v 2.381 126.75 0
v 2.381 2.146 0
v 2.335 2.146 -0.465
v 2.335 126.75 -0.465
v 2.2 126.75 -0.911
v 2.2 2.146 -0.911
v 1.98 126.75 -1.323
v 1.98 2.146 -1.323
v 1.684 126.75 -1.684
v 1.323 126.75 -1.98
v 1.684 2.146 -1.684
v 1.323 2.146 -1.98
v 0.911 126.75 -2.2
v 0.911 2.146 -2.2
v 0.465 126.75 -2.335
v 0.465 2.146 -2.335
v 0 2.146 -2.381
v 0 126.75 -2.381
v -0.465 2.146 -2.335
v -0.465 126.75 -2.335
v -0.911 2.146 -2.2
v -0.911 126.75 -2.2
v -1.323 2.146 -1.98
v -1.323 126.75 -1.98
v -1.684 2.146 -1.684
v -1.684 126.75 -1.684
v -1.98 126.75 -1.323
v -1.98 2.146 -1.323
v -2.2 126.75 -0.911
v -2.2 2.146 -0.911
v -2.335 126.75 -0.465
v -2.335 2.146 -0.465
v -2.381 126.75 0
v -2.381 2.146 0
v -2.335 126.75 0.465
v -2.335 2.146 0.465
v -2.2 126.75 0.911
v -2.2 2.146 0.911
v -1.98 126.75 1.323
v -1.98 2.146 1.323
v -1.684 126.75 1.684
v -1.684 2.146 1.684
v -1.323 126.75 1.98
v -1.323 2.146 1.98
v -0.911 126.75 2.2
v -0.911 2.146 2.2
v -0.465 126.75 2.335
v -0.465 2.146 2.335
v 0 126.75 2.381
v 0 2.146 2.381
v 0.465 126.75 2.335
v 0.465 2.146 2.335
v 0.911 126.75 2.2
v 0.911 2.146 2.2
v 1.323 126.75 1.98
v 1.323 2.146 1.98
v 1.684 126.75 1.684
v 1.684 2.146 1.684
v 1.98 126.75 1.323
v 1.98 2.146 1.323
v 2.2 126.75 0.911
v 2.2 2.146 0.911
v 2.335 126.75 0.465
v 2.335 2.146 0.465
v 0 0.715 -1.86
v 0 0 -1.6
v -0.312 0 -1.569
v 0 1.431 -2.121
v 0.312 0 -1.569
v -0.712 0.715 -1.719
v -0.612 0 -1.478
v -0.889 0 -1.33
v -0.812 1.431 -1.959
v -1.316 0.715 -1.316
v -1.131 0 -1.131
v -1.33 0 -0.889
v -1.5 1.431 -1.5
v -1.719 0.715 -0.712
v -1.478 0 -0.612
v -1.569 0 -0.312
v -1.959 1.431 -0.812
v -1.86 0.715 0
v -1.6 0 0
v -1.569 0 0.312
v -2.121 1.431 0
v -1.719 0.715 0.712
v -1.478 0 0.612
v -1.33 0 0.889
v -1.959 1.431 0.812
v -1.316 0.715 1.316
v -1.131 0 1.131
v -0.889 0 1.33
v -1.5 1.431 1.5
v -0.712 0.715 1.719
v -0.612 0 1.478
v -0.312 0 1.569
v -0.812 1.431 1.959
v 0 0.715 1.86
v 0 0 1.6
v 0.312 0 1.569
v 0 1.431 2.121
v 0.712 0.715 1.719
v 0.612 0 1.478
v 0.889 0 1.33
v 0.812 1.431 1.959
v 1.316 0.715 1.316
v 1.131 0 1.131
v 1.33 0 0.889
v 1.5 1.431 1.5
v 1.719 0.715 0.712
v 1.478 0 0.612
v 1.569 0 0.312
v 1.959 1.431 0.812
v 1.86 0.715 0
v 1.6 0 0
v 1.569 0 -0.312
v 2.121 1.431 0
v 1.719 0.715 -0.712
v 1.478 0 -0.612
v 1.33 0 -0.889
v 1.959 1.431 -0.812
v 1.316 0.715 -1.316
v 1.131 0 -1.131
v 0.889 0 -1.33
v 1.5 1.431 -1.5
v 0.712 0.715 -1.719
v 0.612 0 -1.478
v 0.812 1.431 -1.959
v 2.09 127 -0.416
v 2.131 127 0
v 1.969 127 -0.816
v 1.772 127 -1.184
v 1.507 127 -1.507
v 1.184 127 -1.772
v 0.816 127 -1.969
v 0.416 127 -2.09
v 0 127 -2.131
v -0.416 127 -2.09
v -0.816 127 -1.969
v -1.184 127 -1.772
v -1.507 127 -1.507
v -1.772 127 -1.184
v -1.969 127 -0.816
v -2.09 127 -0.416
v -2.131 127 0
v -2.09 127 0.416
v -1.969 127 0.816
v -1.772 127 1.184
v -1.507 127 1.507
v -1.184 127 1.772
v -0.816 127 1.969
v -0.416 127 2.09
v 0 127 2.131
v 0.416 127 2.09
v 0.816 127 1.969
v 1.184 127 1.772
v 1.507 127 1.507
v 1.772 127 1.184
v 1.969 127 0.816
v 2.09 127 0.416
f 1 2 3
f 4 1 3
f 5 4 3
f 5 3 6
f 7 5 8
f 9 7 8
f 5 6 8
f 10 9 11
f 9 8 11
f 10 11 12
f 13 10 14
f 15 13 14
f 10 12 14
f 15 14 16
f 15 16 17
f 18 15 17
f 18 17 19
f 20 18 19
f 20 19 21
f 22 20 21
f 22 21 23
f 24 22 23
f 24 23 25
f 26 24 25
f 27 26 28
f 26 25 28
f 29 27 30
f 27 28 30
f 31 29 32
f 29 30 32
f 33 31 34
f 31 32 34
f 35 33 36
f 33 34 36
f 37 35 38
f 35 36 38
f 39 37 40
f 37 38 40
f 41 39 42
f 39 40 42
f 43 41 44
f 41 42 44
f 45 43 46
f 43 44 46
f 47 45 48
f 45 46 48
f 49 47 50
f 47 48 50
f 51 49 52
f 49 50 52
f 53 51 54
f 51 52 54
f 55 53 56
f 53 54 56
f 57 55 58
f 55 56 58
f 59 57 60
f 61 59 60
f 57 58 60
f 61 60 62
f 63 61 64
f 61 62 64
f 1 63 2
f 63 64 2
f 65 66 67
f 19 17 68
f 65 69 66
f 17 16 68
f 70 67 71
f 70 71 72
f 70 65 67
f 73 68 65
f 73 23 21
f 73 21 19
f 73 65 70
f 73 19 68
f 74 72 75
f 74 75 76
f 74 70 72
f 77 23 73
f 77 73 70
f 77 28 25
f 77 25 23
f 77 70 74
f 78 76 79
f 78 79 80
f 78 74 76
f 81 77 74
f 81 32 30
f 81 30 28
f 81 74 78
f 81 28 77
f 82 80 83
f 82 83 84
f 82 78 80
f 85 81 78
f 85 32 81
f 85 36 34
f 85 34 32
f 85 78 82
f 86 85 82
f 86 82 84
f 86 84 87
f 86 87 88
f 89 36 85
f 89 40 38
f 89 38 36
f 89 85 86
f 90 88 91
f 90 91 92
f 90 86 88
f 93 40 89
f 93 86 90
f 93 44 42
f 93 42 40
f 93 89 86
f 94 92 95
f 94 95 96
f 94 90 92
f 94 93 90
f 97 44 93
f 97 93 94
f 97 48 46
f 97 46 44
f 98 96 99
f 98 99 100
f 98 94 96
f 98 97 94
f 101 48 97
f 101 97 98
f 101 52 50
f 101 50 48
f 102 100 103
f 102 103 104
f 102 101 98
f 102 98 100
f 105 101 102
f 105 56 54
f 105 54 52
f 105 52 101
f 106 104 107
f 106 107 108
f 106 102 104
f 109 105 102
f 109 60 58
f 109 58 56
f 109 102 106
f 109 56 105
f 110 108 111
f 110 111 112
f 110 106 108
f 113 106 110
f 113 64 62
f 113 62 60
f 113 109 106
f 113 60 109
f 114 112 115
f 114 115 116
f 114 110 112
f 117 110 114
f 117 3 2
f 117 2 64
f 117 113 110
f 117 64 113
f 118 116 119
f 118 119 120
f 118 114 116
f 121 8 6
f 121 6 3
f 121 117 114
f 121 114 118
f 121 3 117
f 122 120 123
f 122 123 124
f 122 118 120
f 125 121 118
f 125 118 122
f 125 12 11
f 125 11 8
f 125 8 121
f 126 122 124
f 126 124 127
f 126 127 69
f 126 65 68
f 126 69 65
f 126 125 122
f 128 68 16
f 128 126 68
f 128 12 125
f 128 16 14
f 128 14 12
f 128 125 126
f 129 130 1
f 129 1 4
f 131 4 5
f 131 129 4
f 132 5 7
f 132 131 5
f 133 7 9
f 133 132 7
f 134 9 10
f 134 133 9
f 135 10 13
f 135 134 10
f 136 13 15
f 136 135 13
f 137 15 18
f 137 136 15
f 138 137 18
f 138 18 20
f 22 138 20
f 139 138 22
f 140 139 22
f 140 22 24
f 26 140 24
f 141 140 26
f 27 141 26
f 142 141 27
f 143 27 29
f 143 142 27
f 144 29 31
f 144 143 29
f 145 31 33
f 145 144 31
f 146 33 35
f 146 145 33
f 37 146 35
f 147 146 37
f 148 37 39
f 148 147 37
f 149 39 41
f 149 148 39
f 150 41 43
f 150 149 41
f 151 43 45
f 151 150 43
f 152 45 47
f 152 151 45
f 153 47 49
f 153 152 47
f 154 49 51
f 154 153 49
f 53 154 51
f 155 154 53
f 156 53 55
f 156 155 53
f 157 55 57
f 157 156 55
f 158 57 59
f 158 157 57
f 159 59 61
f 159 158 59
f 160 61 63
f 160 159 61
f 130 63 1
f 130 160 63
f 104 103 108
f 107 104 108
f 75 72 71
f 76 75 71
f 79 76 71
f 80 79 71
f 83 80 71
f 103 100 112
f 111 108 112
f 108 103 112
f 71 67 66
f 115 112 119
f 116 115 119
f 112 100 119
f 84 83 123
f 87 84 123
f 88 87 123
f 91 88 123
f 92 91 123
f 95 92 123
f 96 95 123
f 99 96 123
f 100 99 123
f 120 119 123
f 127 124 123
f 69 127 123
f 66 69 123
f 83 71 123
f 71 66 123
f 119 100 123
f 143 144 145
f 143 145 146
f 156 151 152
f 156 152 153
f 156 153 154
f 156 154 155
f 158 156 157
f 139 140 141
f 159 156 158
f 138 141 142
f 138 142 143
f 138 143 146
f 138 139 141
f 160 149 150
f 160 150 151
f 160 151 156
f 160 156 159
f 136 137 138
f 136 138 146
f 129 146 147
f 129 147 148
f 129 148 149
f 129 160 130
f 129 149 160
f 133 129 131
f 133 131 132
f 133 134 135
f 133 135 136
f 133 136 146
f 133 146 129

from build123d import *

# Parameters (mm, degrees)
SKETCH1_R           = 2.38125
BOSS_EXTRUDE1_DEPTH = 127
CHAMFER1_SIZE       = 0.25


with BuildPart() as part:
    # Sketch1 → Boss-Extrude1 (new body)
    with BuildSketch(Plane(origin=(0, 0, 0), x_dir=(1, 0, 0), z_dir=(0, 1, 0))):
        Circle(SKETCH1_R)
    extrude(amount=BOSS_EXTRUDE1_DEPTH)

    # Chamfer1
    chamfer1_edges = [part.edges().sort_by_distance(p)[0] for p in [
        (-2.38125, 0, 0),
        (-2.38125, 127, 0),
    ]]
    chamfer(chamfer1_edges, length=CHAMFER1_SIZE)

    # Sketch2 → Cut-Revolve1 (revolve, cut)
    with BuildSketch(Plane(origin=(0, 0, 0), x_dir=(0, 0, -1), z_dir=(1, 0, 0))):
        Polygon((1.6, 0), (2.6, 2.747477419), (2.6, 0), align=None)
    revolve(axis=Axis((0, 0, 0), (0, 1, 0)), mode=Mode.SUBTRACT)


solid = part.part
